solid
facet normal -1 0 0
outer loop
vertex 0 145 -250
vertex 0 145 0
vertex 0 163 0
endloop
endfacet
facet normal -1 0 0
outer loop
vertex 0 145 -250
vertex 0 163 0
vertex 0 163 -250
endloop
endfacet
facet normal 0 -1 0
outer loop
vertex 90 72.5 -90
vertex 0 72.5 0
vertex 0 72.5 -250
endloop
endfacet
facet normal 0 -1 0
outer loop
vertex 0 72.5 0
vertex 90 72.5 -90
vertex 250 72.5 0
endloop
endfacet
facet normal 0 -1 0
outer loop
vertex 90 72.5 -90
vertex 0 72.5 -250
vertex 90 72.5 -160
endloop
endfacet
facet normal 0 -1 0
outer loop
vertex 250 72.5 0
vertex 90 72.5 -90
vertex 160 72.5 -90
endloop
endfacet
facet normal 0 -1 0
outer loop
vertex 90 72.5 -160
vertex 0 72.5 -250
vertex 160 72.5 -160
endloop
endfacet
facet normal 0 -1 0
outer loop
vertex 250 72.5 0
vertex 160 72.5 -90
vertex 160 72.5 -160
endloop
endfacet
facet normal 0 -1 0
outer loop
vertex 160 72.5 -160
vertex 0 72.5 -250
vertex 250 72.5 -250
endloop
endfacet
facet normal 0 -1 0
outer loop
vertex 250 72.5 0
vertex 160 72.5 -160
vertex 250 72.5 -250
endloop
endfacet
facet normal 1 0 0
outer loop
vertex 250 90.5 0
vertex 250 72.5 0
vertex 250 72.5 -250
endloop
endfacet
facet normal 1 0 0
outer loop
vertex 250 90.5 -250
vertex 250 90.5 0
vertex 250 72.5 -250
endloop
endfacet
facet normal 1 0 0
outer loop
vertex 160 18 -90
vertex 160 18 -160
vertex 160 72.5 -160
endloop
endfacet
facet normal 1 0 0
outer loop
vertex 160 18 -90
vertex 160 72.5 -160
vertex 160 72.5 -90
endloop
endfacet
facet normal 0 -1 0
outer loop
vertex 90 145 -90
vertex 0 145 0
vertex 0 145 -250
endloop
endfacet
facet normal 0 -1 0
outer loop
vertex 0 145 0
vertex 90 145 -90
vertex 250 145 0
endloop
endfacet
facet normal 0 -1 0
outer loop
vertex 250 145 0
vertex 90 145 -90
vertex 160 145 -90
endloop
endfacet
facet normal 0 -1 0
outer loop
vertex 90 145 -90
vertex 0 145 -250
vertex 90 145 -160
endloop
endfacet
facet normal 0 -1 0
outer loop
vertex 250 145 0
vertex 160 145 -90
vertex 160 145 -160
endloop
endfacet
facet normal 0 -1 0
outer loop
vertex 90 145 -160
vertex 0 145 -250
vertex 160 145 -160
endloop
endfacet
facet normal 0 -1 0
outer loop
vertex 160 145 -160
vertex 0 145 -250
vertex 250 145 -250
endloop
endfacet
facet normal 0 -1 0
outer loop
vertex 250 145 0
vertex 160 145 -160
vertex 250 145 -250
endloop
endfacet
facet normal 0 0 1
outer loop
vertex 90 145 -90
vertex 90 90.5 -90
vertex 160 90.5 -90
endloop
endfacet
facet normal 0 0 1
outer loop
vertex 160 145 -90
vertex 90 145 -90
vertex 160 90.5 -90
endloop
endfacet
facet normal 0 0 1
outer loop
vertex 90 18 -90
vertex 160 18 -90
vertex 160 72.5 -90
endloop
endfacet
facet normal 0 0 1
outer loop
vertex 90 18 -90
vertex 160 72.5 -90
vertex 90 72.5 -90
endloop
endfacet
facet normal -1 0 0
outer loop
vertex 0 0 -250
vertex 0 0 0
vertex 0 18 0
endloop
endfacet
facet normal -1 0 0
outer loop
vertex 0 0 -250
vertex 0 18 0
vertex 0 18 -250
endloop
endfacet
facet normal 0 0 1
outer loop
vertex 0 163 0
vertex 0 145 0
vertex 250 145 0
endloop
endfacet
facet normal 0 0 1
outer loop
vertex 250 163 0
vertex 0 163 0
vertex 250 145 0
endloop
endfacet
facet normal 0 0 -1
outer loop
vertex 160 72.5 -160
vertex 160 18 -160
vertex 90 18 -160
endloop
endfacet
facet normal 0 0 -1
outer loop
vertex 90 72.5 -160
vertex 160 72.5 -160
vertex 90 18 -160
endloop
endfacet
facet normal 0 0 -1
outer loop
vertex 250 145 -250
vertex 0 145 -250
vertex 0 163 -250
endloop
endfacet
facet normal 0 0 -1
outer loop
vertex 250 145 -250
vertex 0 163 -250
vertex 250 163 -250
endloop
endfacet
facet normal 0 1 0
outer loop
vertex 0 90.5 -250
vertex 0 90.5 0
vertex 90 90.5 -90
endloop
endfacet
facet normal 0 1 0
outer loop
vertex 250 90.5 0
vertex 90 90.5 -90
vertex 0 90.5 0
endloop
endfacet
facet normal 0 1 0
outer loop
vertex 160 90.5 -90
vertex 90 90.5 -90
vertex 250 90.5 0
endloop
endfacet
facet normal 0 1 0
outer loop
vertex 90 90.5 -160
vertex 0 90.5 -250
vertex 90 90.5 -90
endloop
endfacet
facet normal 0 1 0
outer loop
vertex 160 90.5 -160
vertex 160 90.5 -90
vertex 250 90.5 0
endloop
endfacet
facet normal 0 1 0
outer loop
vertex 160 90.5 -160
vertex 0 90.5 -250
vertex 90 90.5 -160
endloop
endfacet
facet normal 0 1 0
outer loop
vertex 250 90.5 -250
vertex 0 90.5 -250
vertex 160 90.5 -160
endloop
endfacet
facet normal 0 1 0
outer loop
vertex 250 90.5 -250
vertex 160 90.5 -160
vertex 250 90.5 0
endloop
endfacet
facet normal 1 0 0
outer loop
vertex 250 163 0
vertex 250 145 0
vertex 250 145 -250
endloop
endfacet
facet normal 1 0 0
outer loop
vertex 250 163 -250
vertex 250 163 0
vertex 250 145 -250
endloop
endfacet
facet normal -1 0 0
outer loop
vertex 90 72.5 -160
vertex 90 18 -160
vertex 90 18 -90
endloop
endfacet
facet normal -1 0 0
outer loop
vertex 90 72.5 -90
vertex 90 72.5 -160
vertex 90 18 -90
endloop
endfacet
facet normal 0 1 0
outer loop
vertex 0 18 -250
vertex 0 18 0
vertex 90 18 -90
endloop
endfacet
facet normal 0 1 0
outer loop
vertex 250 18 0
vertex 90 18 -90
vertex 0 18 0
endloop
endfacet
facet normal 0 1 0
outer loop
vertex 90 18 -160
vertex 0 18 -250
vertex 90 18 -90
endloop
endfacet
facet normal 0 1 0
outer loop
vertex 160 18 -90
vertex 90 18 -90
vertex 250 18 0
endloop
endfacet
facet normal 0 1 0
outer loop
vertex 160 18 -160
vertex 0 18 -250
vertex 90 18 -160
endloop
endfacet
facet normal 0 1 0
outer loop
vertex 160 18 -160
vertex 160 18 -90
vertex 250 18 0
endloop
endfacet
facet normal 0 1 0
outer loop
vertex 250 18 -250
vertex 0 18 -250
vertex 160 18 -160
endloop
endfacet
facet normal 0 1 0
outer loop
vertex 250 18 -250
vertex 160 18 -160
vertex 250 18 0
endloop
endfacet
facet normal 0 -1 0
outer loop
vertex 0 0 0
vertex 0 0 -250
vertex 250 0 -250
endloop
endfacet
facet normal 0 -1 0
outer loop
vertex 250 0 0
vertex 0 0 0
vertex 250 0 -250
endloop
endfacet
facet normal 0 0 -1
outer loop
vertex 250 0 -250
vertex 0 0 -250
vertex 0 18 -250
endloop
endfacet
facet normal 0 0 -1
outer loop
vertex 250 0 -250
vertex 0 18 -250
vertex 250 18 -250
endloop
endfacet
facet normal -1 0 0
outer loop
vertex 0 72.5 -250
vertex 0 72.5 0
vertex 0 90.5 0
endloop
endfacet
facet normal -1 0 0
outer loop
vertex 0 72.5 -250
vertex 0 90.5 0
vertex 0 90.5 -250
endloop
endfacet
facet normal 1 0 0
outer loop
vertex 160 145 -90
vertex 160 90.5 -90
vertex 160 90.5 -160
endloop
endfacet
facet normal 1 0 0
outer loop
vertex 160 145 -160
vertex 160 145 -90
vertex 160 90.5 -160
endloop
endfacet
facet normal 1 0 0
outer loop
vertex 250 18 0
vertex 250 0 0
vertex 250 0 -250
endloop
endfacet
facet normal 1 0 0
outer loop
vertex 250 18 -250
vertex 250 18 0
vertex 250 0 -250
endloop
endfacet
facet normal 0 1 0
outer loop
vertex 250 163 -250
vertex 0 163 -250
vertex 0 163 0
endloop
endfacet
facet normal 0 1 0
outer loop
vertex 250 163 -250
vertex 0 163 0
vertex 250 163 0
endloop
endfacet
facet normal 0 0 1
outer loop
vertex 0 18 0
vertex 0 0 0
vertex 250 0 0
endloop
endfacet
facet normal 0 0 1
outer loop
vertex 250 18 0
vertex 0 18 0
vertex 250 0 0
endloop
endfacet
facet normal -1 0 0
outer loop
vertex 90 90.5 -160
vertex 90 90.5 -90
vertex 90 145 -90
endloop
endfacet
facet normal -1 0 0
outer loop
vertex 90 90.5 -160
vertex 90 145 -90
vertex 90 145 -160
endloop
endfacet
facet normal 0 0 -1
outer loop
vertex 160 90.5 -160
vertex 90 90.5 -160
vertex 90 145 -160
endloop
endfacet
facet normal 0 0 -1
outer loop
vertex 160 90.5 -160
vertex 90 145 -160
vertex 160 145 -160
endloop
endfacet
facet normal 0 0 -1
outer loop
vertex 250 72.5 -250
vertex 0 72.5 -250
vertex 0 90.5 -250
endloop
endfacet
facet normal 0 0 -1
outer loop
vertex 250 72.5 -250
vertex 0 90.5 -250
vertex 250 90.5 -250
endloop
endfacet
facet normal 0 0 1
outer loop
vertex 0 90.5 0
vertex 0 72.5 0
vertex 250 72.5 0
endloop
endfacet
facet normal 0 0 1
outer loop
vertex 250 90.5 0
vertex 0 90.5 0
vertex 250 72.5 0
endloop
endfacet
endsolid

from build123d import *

# Parameters (mm, degrees)
ESQUISSE1_W      = 250
ESQUISSE1_H      = 250
EXTRUSION1_DEPTH = 18
ESQUISSE2_W      = 70
ESQUISSE2_H      = 70
EXTRUSION2_DEPTH = 54.5
ESQUISSE3_W      = 250
ESQUISSE3_H      = 250
EXTRUSION3_DEPTH = 18
ESQUISSE4_W      = 70
ESQUISSE4_H      = 70
EXTRUSION4_DEPTH = 54.5
ESQUISSE5_W      = 250
ESQUISSE5_H      = 250
EXTRUSION5_DEPTH = 18


with BuildPart() as part:
    # Esquisse1 → Extrusion1 (new body)
    with BuildSketch(Plane(origin=(0, 0, 0), x_dir=(1, 0, 0), z_dir=(0, 1, 0))):
        with Locations((125, 125)):
            Rectangle(ESQUISSE1_W, ESQUISSE1_H)
    extrude(amount=EXTRUSION1_DEPTH)

    # Esquisse2 → Extrusion2 (add)
    with BuildSketch(Plane(origin=(0, 18, 0), x_dir=(-1, 0, 0), z_dir=(0, 1, 0))):
        with Locations((-125, -125)):
            Rectangle(ESQUISSE2_W, ESQUISSE2_H)
    extrude(amount=EXTRUSION2_DEPTH)

    # Esquisse3 → Extrusion3 (add)
    with BuildSketch(Plane(origin=(0, 72.5, 0), x_dir=(1, 0, 0), z_dir=(0, 1, 0))):
        with Locations((125, 125)):
            Rectangle(ESQUISSE3_W, ESQUISSE3_H)
    extrude(amount=EXTRUSION3_DEPTH)

    # Esquisse4 → Extrusion4 (add)
    with BuildSketch(Plane(origin=(0, 90.5, 0), x_dir=(1, 0, 0), z_dir=(0, 1, 0))):
        with Locations((125, 125)):
            Rectangle(ESQUISSE4_W, ESQUISSE4_H)
    extrude(amount=EXTRUSION4_DEPTH)

    # Esquisse5 → Extrusion5 (add)
    with BuildSketch(Plane(origin=(0, 145, 0), x_dir=(1, 0, 0), z_dir=(0, 1, 0))):
        with Locations((125, 125)):
            Rectangle(ESQUISSE5_W, ESQUISSE5_H)
    extrude(amount=EXTRUSION5_DEPTH)


solid = part.part
